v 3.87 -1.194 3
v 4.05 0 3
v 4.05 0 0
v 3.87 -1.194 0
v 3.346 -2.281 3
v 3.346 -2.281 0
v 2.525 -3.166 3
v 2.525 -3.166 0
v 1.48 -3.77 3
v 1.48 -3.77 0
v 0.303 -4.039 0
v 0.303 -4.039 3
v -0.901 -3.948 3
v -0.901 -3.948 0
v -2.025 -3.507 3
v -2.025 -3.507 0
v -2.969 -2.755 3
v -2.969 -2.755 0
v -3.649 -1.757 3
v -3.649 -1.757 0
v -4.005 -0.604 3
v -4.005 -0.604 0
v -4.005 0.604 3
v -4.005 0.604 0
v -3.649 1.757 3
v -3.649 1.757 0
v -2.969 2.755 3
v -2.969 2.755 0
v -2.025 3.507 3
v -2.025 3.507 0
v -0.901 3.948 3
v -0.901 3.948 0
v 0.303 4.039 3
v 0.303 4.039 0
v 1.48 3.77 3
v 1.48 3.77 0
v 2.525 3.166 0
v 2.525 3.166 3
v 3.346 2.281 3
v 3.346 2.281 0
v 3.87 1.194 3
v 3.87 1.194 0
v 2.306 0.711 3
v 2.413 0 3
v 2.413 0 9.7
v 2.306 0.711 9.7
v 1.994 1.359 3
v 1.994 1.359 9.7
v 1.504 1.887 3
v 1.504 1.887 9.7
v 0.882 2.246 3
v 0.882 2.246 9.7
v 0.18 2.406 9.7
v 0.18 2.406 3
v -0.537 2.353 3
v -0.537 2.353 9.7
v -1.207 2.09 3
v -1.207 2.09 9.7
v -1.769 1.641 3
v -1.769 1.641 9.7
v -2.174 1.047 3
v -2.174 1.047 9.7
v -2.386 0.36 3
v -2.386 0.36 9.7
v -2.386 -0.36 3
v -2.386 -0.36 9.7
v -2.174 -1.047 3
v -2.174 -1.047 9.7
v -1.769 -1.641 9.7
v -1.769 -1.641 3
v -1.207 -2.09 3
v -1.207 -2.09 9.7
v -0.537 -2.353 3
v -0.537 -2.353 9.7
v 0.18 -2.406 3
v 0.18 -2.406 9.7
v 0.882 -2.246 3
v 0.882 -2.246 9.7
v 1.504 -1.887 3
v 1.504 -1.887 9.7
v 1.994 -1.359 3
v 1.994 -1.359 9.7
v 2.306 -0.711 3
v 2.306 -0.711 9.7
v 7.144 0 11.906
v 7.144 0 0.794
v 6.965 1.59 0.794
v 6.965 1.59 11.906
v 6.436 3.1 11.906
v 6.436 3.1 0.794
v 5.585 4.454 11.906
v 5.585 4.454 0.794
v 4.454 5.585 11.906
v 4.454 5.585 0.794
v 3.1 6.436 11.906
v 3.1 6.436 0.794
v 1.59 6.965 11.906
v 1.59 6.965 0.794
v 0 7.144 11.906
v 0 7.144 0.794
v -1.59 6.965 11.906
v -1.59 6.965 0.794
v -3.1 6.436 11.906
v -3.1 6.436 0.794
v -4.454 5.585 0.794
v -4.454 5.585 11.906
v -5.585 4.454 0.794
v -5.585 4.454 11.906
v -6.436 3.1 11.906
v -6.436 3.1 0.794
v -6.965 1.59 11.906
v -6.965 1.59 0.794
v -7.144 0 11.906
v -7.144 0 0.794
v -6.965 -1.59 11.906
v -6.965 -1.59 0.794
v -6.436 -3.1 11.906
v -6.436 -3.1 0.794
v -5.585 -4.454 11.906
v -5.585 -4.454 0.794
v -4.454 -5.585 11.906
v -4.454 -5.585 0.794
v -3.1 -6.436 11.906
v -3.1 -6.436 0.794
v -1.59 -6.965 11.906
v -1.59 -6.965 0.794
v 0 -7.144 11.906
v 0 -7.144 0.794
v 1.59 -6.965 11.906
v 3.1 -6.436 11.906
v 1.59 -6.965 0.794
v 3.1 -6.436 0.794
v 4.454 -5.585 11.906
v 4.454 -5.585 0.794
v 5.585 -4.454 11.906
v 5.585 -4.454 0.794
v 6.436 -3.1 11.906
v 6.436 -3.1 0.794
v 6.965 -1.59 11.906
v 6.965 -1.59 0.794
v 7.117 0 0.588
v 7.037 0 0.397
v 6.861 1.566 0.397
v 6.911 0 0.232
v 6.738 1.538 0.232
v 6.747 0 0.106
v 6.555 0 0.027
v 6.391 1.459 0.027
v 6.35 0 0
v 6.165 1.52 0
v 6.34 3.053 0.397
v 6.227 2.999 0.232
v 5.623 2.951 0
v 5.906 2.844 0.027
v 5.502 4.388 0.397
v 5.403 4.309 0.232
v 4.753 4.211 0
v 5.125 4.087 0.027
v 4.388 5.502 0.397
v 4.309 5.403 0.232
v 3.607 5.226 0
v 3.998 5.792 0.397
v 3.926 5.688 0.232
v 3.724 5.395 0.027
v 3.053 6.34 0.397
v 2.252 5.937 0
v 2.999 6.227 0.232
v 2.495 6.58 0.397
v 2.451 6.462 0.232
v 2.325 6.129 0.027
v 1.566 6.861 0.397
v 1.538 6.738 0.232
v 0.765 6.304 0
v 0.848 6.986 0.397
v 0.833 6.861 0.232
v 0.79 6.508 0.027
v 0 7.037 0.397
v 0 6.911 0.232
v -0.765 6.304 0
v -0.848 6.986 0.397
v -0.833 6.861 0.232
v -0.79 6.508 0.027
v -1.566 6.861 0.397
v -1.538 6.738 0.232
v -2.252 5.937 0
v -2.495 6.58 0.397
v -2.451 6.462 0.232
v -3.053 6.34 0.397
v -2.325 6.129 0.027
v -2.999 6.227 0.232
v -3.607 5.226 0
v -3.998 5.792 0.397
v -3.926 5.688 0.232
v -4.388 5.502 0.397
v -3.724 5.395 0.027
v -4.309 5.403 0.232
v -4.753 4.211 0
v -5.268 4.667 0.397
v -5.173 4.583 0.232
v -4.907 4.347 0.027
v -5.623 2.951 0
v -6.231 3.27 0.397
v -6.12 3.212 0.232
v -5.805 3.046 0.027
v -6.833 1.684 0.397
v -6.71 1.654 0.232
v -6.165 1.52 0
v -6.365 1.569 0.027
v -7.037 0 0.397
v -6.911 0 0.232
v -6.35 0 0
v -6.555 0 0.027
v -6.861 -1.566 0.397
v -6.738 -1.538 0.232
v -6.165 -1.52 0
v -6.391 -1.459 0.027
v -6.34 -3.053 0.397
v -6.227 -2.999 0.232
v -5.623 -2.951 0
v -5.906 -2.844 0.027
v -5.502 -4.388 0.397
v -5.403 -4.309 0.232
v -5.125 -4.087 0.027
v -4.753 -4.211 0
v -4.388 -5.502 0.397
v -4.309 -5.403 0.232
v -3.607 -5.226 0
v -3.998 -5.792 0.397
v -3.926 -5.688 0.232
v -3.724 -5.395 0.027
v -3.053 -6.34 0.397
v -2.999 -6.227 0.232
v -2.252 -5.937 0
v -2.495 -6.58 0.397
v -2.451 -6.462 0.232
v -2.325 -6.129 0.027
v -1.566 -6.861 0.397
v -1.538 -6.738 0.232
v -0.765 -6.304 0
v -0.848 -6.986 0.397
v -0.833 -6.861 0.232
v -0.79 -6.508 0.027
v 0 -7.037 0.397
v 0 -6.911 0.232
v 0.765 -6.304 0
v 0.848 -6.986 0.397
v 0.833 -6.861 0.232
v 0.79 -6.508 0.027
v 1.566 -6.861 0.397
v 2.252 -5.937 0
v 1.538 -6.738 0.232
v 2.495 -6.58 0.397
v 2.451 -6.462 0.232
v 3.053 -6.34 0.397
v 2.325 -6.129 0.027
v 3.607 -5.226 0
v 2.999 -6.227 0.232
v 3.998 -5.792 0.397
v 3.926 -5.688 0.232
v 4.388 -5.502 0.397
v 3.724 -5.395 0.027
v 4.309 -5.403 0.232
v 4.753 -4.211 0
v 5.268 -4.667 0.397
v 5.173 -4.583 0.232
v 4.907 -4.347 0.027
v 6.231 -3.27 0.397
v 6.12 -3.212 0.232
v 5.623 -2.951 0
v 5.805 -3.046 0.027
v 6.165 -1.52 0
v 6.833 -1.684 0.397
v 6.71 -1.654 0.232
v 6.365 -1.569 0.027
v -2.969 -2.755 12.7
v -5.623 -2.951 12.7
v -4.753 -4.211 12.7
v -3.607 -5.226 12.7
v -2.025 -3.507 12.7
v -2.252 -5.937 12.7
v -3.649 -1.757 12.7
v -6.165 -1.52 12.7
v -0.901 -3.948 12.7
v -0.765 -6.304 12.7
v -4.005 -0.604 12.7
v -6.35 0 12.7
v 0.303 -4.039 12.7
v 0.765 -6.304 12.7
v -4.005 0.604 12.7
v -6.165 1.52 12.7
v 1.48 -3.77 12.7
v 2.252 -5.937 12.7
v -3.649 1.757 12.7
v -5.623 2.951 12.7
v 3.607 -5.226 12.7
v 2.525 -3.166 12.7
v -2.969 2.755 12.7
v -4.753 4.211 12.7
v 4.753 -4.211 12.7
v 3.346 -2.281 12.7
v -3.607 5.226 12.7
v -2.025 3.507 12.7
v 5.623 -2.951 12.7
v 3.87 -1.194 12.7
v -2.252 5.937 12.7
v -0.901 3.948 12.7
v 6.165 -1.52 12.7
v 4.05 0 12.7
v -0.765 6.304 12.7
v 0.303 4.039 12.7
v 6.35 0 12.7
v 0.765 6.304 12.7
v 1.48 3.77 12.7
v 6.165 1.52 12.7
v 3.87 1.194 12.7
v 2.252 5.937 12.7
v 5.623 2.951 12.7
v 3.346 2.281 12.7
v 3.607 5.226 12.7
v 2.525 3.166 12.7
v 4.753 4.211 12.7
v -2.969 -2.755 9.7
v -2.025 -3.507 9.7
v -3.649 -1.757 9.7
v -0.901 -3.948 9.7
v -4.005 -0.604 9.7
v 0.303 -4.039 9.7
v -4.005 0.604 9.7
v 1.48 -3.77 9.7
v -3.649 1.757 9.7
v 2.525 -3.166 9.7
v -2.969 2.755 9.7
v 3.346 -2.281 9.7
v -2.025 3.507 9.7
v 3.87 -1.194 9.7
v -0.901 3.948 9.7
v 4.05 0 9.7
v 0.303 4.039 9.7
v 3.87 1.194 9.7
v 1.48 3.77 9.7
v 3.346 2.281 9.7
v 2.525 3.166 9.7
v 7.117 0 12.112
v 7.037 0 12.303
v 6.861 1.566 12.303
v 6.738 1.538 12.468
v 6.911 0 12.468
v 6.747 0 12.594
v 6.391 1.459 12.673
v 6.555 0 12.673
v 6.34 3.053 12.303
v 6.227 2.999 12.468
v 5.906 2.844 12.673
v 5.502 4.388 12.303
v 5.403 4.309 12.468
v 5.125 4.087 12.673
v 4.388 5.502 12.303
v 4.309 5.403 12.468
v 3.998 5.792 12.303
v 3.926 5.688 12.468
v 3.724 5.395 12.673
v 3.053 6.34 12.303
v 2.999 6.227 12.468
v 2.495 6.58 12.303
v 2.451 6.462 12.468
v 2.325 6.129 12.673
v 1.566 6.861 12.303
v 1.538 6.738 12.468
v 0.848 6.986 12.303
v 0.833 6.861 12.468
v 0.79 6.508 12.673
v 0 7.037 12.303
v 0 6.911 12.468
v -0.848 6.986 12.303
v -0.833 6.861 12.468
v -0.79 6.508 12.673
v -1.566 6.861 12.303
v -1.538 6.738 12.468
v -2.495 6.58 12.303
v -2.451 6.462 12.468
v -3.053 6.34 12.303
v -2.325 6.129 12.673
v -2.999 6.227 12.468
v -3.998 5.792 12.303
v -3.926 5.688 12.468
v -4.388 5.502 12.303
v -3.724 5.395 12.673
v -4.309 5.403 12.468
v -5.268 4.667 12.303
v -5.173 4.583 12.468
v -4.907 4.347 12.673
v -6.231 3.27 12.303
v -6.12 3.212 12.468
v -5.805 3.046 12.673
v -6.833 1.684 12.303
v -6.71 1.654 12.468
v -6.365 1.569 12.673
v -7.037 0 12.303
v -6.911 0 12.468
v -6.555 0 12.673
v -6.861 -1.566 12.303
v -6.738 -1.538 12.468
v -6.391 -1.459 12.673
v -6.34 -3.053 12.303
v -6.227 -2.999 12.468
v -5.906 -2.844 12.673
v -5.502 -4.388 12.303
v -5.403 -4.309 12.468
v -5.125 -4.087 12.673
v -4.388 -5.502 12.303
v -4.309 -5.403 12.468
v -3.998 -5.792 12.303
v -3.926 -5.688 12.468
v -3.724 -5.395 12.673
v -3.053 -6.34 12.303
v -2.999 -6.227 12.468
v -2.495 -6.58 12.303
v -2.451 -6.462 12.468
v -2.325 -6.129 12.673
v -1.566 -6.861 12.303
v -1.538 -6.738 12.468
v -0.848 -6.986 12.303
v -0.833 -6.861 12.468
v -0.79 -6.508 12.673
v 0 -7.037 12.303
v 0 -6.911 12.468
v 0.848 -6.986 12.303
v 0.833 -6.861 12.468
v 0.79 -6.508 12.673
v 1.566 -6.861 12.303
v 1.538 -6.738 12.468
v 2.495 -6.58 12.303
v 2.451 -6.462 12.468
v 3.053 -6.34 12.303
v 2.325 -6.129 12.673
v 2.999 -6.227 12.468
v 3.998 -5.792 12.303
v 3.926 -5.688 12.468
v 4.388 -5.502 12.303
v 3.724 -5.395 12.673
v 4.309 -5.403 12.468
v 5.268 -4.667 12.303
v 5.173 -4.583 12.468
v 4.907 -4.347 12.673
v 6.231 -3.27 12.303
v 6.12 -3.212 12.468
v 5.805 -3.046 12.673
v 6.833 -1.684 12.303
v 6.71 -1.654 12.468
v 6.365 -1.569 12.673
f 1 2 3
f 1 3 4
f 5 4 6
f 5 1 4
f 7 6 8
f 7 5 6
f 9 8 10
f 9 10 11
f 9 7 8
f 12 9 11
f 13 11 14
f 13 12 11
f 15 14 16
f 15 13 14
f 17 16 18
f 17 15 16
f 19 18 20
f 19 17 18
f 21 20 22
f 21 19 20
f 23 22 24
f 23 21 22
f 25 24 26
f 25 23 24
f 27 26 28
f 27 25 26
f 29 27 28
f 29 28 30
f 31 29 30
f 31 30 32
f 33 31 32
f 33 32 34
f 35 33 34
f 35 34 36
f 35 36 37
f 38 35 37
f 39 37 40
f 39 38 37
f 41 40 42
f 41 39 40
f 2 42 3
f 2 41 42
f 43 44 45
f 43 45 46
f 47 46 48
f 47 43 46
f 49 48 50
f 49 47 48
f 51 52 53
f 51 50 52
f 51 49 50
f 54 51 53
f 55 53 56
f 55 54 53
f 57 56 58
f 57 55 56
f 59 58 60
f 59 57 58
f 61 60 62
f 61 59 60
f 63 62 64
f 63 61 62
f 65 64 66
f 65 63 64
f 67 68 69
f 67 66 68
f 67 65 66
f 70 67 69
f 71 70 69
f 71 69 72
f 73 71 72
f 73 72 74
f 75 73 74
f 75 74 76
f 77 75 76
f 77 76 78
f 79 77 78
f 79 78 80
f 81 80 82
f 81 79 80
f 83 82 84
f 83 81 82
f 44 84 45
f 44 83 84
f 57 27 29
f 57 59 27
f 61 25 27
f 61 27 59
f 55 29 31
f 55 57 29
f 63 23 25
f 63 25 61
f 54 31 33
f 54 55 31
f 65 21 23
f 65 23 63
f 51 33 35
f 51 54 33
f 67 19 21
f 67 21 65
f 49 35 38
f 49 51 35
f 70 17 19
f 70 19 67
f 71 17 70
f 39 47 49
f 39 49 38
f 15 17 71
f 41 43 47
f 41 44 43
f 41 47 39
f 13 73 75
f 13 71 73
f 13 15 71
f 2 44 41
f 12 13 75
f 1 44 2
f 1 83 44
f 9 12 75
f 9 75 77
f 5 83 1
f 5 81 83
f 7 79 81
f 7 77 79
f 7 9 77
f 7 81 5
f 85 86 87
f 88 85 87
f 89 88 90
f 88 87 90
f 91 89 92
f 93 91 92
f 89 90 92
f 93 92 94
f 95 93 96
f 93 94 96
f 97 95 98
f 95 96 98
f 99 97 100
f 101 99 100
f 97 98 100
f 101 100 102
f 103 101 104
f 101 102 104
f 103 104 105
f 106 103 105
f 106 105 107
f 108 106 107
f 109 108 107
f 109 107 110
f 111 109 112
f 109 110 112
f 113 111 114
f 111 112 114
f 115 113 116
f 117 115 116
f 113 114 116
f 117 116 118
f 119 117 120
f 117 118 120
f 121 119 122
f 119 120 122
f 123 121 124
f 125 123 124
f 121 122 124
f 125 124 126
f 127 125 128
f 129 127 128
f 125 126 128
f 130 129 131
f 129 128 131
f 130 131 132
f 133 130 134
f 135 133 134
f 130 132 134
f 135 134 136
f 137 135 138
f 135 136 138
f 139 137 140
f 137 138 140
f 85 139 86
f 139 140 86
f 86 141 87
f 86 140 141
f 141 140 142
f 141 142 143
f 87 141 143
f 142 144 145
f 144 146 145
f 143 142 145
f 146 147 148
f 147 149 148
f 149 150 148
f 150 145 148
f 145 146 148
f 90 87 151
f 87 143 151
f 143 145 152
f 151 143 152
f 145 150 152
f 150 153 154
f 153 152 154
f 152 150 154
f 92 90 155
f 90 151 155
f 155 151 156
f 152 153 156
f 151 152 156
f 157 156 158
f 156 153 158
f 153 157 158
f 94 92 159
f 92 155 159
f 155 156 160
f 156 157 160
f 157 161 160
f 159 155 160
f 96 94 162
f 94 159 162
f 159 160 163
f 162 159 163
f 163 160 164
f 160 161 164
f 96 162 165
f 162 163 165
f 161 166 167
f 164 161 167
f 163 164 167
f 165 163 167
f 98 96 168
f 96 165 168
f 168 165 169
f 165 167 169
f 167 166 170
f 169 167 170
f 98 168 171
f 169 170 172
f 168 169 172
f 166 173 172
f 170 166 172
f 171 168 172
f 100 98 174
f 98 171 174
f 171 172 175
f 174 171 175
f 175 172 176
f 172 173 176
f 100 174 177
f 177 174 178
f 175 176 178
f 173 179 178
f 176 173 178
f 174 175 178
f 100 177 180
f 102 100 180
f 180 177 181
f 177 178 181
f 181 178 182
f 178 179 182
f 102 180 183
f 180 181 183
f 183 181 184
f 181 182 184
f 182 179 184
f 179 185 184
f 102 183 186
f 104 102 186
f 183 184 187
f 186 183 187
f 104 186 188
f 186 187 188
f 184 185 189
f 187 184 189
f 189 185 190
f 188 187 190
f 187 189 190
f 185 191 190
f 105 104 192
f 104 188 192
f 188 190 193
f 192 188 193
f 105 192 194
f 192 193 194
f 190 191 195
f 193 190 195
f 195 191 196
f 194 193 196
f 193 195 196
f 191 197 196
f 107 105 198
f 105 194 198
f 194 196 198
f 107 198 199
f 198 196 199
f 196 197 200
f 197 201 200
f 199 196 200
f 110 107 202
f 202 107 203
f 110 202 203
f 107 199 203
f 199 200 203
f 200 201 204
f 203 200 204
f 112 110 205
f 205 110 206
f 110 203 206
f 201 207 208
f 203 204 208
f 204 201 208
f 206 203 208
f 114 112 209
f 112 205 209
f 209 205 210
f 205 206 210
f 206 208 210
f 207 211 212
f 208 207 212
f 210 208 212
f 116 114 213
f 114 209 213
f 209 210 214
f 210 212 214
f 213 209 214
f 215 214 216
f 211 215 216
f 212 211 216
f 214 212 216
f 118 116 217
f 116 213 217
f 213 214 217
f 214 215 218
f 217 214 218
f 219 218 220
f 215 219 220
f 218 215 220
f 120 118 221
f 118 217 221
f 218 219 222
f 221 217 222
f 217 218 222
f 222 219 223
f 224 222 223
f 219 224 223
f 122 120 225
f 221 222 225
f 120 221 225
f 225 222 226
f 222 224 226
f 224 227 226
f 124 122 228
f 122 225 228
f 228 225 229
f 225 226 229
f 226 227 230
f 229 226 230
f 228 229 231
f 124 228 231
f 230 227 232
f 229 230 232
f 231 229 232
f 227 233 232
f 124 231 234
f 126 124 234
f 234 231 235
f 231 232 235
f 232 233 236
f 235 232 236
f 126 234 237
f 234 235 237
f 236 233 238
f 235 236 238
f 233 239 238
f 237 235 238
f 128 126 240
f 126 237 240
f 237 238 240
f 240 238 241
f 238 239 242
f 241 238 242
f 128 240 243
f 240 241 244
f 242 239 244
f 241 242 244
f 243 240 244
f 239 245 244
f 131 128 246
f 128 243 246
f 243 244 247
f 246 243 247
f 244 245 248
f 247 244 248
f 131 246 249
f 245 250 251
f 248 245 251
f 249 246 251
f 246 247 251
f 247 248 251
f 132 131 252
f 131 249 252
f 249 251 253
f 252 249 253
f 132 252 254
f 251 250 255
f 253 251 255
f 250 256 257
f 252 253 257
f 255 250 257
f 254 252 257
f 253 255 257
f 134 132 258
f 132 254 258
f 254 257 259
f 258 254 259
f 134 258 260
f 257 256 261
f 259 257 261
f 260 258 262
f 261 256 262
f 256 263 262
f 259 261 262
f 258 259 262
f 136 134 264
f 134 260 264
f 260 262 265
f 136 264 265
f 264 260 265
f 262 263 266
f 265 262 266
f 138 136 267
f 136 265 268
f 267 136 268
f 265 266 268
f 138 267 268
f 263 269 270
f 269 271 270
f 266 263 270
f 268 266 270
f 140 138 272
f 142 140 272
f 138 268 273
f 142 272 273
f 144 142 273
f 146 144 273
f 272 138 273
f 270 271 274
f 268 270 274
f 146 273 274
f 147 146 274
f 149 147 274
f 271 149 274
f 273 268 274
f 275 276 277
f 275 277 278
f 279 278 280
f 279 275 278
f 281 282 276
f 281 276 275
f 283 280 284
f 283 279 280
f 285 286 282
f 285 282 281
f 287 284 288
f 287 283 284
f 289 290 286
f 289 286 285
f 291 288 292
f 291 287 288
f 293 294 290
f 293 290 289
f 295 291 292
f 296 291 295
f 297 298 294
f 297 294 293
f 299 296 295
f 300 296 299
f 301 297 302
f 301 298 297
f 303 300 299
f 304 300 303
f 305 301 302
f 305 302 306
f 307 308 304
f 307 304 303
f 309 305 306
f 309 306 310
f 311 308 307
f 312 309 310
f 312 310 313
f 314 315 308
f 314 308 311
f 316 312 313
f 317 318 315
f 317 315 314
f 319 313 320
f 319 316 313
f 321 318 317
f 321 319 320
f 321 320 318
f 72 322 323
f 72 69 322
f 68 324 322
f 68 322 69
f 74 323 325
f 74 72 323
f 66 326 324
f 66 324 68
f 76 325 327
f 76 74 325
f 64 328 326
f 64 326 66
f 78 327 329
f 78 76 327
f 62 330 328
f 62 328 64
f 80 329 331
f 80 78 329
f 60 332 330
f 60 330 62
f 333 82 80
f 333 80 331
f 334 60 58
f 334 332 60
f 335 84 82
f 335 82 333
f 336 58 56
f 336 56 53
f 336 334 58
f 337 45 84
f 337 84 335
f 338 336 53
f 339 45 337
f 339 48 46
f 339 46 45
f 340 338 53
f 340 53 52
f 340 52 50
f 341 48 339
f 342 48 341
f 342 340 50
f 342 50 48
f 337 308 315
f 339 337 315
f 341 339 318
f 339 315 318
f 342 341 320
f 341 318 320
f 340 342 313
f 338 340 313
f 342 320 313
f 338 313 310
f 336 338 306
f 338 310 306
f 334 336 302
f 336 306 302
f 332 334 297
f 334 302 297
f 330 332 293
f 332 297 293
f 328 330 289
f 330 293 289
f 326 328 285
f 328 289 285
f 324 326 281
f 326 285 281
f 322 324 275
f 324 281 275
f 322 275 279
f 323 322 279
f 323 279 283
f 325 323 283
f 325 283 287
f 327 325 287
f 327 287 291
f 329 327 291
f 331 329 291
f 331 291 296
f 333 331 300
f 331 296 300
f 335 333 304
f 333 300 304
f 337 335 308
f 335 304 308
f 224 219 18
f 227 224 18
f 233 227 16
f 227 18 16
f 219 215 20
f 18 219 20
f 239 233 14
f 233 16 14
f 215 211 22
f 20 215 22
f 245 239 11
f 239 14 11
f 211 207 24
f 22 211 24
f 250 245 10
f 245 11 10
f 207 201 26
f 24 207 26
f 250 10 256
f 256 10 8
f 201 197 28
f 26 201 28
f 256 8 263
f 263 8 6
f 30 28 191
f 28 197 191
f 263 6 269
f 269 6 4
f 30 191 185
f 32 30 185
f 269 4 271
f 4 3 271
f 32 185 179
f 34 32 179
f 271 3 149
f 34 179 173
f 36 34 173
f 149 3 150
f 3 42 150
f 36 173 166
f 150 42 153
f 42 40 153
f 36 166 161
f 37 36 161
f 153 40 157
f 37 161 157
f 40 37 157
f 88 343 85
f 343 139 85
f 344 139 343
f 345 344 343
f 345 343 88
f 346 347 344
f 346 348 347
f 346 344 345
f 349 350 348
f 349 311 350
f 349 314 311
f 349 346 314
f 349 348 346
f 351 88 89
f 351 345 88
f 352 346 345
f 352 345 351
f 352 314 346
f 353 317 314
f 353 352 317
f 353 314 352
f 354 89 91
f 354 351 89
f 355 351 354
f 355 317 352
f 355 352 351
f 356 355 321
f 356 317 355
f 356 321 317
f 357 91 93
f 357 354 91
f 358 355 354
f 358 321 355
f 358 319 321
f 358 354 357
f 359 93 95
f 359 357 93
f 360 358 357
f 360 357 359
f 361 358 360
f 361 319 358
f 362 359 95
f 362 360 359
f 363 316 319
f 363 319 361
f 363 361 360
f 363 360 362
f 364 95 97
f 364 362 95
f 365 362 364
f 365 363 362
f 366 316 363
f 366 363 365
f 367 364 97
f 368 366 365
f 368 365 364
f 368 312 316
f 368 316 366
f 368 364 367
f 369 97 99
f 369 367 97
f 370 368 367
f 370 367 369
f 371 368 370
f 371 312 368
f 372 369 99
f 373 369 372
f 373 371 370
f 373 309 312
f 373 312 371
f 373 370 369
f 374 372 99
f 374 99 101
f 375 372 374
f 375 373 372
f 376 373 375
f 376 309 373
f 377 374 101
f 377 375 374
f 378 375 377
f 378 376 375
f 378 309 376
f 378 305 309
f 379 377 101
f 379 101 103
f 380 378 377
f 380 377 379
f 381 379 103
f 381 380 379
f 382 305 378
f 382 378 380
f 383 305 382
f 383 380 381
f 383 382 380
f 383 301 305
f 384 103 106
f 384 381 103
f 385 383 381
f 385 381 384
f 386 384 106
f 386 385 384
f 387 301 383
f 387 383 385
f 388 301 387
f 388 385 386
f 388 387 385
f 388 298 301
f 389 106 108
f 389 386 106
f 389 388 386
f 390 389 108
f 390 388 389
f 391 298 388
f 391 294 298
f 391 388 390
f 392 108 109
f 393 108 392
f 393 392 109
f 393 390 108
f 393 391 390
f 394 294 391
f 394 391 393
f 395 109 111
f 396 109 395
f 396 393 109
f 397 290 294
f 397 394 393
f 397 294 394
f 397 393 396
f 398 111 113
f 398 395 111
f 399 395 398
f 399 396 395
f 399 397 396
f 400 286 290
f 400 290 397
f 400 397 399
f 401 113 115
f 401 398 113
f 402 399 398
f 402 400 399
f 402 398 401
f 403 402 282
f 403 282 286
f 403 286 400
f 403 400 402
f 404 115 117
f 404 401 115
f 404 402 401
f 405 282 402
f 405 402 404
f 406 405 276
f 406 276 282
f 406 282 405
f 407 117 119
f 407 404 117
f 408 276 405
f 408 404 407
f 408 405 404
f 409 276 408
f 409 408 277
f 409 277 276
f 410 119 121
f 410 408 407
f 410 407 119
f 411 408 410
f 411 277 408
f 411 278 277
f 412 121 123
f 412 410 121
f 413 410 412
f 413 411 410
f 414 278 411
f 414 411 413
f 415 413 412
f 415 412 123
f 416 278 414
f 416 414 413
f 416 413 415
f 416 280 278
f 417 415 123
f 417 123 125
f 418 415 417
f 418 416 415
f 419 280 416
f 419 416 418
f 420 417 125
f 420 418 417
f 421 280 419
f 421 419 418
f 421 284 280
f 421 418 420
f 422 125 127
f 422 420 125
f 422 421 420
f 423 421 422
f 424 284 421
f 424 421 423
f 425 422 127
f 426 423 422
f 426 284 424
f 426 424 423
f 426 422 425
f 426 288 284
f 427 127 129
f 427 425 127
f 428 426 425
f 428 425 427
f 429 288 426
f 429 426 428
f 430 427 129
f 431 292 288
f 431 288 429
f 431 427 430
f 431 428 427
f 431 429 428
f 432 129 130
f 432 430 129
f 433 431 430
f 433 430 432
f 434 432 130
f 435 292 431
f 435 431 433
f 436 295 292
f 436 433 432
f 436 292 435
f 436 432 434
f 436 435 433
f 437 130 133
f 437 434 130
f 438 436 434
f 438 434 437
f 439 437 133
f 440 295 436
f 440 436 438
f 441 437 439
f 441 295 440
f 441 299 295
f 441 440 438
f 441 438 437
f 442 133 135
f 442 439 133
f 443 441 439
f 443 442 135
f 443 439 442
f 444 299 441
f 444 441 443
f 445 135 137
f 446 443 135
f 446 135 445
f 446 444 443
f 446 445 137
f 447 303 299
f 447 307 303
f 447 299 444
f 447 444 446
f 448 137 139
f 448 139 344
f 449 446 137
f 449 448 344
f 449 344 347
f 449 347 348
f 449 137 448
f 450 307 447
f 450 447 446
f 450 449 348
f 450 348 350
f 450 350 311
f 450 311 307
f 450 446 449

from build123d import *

# Parameters (mm, degrees)
SKETCH1_R           = 7.14375
SKETCH1_R_2         = 2.413
BOSS_EXTRUDE1_DEPTH = 12.7
SKETCH2_R           = 4.05
CUT_EXTRUDE1_DEPTH  = 3
CUT_EXTRUDE2_START  = -3
SKETCH3_R           = 4.05
CUT_EXTRUDE2_DEPTH  = 3
FILLET1_R           = 0.79375


with BuildPart() as part:
    # Sketch1 → Boss-Extrude1 (new body)
    with BuildSketch(Plane.XY):
        Circle(SKETCH1_R)
        Circle(SKETCH1_R_2, mode=Mode.SUBTRACT)
    extrude(amount=BOSS_EXTRUDE1_DEPTH)

    # Sketch2 → Cut-Extrude1 (cut)
    with BuildSketch(Plane.XY.offset(12.7)):
        Circle(SKETCH2_R)
    extrude(amount=-CUT_EXTRUDE1_DEPTH, mode=Mode.SUBTRACT)

    # Sketch3 → Cut-Extrude2 (cut)
    with BuildSketch(Plane(origin=(0, 0, 0), x_dir=(-1, 0, 0), z_dir=(0, 0, -1)).offset(CUT_EXTRUDE2_START)):
        with Locations(Location((0, 0, 0), (0, 0, 180))):
            Circle(SKETCH3_R)
    extrude(amount=CUT_EXTRUDE2_DEPTH, mode=Mode.SUBTRACT)

    # Fillet1
    fillet1_edges = [part.edges().sort_by_distance(p)[0] for p in [
        (-7.14375, 0, 0),
        (-7.14375, 0, 12.7),
    ]]
    fillet(fillet1_edges, radius=FILLET1_R)


solid = part.part
